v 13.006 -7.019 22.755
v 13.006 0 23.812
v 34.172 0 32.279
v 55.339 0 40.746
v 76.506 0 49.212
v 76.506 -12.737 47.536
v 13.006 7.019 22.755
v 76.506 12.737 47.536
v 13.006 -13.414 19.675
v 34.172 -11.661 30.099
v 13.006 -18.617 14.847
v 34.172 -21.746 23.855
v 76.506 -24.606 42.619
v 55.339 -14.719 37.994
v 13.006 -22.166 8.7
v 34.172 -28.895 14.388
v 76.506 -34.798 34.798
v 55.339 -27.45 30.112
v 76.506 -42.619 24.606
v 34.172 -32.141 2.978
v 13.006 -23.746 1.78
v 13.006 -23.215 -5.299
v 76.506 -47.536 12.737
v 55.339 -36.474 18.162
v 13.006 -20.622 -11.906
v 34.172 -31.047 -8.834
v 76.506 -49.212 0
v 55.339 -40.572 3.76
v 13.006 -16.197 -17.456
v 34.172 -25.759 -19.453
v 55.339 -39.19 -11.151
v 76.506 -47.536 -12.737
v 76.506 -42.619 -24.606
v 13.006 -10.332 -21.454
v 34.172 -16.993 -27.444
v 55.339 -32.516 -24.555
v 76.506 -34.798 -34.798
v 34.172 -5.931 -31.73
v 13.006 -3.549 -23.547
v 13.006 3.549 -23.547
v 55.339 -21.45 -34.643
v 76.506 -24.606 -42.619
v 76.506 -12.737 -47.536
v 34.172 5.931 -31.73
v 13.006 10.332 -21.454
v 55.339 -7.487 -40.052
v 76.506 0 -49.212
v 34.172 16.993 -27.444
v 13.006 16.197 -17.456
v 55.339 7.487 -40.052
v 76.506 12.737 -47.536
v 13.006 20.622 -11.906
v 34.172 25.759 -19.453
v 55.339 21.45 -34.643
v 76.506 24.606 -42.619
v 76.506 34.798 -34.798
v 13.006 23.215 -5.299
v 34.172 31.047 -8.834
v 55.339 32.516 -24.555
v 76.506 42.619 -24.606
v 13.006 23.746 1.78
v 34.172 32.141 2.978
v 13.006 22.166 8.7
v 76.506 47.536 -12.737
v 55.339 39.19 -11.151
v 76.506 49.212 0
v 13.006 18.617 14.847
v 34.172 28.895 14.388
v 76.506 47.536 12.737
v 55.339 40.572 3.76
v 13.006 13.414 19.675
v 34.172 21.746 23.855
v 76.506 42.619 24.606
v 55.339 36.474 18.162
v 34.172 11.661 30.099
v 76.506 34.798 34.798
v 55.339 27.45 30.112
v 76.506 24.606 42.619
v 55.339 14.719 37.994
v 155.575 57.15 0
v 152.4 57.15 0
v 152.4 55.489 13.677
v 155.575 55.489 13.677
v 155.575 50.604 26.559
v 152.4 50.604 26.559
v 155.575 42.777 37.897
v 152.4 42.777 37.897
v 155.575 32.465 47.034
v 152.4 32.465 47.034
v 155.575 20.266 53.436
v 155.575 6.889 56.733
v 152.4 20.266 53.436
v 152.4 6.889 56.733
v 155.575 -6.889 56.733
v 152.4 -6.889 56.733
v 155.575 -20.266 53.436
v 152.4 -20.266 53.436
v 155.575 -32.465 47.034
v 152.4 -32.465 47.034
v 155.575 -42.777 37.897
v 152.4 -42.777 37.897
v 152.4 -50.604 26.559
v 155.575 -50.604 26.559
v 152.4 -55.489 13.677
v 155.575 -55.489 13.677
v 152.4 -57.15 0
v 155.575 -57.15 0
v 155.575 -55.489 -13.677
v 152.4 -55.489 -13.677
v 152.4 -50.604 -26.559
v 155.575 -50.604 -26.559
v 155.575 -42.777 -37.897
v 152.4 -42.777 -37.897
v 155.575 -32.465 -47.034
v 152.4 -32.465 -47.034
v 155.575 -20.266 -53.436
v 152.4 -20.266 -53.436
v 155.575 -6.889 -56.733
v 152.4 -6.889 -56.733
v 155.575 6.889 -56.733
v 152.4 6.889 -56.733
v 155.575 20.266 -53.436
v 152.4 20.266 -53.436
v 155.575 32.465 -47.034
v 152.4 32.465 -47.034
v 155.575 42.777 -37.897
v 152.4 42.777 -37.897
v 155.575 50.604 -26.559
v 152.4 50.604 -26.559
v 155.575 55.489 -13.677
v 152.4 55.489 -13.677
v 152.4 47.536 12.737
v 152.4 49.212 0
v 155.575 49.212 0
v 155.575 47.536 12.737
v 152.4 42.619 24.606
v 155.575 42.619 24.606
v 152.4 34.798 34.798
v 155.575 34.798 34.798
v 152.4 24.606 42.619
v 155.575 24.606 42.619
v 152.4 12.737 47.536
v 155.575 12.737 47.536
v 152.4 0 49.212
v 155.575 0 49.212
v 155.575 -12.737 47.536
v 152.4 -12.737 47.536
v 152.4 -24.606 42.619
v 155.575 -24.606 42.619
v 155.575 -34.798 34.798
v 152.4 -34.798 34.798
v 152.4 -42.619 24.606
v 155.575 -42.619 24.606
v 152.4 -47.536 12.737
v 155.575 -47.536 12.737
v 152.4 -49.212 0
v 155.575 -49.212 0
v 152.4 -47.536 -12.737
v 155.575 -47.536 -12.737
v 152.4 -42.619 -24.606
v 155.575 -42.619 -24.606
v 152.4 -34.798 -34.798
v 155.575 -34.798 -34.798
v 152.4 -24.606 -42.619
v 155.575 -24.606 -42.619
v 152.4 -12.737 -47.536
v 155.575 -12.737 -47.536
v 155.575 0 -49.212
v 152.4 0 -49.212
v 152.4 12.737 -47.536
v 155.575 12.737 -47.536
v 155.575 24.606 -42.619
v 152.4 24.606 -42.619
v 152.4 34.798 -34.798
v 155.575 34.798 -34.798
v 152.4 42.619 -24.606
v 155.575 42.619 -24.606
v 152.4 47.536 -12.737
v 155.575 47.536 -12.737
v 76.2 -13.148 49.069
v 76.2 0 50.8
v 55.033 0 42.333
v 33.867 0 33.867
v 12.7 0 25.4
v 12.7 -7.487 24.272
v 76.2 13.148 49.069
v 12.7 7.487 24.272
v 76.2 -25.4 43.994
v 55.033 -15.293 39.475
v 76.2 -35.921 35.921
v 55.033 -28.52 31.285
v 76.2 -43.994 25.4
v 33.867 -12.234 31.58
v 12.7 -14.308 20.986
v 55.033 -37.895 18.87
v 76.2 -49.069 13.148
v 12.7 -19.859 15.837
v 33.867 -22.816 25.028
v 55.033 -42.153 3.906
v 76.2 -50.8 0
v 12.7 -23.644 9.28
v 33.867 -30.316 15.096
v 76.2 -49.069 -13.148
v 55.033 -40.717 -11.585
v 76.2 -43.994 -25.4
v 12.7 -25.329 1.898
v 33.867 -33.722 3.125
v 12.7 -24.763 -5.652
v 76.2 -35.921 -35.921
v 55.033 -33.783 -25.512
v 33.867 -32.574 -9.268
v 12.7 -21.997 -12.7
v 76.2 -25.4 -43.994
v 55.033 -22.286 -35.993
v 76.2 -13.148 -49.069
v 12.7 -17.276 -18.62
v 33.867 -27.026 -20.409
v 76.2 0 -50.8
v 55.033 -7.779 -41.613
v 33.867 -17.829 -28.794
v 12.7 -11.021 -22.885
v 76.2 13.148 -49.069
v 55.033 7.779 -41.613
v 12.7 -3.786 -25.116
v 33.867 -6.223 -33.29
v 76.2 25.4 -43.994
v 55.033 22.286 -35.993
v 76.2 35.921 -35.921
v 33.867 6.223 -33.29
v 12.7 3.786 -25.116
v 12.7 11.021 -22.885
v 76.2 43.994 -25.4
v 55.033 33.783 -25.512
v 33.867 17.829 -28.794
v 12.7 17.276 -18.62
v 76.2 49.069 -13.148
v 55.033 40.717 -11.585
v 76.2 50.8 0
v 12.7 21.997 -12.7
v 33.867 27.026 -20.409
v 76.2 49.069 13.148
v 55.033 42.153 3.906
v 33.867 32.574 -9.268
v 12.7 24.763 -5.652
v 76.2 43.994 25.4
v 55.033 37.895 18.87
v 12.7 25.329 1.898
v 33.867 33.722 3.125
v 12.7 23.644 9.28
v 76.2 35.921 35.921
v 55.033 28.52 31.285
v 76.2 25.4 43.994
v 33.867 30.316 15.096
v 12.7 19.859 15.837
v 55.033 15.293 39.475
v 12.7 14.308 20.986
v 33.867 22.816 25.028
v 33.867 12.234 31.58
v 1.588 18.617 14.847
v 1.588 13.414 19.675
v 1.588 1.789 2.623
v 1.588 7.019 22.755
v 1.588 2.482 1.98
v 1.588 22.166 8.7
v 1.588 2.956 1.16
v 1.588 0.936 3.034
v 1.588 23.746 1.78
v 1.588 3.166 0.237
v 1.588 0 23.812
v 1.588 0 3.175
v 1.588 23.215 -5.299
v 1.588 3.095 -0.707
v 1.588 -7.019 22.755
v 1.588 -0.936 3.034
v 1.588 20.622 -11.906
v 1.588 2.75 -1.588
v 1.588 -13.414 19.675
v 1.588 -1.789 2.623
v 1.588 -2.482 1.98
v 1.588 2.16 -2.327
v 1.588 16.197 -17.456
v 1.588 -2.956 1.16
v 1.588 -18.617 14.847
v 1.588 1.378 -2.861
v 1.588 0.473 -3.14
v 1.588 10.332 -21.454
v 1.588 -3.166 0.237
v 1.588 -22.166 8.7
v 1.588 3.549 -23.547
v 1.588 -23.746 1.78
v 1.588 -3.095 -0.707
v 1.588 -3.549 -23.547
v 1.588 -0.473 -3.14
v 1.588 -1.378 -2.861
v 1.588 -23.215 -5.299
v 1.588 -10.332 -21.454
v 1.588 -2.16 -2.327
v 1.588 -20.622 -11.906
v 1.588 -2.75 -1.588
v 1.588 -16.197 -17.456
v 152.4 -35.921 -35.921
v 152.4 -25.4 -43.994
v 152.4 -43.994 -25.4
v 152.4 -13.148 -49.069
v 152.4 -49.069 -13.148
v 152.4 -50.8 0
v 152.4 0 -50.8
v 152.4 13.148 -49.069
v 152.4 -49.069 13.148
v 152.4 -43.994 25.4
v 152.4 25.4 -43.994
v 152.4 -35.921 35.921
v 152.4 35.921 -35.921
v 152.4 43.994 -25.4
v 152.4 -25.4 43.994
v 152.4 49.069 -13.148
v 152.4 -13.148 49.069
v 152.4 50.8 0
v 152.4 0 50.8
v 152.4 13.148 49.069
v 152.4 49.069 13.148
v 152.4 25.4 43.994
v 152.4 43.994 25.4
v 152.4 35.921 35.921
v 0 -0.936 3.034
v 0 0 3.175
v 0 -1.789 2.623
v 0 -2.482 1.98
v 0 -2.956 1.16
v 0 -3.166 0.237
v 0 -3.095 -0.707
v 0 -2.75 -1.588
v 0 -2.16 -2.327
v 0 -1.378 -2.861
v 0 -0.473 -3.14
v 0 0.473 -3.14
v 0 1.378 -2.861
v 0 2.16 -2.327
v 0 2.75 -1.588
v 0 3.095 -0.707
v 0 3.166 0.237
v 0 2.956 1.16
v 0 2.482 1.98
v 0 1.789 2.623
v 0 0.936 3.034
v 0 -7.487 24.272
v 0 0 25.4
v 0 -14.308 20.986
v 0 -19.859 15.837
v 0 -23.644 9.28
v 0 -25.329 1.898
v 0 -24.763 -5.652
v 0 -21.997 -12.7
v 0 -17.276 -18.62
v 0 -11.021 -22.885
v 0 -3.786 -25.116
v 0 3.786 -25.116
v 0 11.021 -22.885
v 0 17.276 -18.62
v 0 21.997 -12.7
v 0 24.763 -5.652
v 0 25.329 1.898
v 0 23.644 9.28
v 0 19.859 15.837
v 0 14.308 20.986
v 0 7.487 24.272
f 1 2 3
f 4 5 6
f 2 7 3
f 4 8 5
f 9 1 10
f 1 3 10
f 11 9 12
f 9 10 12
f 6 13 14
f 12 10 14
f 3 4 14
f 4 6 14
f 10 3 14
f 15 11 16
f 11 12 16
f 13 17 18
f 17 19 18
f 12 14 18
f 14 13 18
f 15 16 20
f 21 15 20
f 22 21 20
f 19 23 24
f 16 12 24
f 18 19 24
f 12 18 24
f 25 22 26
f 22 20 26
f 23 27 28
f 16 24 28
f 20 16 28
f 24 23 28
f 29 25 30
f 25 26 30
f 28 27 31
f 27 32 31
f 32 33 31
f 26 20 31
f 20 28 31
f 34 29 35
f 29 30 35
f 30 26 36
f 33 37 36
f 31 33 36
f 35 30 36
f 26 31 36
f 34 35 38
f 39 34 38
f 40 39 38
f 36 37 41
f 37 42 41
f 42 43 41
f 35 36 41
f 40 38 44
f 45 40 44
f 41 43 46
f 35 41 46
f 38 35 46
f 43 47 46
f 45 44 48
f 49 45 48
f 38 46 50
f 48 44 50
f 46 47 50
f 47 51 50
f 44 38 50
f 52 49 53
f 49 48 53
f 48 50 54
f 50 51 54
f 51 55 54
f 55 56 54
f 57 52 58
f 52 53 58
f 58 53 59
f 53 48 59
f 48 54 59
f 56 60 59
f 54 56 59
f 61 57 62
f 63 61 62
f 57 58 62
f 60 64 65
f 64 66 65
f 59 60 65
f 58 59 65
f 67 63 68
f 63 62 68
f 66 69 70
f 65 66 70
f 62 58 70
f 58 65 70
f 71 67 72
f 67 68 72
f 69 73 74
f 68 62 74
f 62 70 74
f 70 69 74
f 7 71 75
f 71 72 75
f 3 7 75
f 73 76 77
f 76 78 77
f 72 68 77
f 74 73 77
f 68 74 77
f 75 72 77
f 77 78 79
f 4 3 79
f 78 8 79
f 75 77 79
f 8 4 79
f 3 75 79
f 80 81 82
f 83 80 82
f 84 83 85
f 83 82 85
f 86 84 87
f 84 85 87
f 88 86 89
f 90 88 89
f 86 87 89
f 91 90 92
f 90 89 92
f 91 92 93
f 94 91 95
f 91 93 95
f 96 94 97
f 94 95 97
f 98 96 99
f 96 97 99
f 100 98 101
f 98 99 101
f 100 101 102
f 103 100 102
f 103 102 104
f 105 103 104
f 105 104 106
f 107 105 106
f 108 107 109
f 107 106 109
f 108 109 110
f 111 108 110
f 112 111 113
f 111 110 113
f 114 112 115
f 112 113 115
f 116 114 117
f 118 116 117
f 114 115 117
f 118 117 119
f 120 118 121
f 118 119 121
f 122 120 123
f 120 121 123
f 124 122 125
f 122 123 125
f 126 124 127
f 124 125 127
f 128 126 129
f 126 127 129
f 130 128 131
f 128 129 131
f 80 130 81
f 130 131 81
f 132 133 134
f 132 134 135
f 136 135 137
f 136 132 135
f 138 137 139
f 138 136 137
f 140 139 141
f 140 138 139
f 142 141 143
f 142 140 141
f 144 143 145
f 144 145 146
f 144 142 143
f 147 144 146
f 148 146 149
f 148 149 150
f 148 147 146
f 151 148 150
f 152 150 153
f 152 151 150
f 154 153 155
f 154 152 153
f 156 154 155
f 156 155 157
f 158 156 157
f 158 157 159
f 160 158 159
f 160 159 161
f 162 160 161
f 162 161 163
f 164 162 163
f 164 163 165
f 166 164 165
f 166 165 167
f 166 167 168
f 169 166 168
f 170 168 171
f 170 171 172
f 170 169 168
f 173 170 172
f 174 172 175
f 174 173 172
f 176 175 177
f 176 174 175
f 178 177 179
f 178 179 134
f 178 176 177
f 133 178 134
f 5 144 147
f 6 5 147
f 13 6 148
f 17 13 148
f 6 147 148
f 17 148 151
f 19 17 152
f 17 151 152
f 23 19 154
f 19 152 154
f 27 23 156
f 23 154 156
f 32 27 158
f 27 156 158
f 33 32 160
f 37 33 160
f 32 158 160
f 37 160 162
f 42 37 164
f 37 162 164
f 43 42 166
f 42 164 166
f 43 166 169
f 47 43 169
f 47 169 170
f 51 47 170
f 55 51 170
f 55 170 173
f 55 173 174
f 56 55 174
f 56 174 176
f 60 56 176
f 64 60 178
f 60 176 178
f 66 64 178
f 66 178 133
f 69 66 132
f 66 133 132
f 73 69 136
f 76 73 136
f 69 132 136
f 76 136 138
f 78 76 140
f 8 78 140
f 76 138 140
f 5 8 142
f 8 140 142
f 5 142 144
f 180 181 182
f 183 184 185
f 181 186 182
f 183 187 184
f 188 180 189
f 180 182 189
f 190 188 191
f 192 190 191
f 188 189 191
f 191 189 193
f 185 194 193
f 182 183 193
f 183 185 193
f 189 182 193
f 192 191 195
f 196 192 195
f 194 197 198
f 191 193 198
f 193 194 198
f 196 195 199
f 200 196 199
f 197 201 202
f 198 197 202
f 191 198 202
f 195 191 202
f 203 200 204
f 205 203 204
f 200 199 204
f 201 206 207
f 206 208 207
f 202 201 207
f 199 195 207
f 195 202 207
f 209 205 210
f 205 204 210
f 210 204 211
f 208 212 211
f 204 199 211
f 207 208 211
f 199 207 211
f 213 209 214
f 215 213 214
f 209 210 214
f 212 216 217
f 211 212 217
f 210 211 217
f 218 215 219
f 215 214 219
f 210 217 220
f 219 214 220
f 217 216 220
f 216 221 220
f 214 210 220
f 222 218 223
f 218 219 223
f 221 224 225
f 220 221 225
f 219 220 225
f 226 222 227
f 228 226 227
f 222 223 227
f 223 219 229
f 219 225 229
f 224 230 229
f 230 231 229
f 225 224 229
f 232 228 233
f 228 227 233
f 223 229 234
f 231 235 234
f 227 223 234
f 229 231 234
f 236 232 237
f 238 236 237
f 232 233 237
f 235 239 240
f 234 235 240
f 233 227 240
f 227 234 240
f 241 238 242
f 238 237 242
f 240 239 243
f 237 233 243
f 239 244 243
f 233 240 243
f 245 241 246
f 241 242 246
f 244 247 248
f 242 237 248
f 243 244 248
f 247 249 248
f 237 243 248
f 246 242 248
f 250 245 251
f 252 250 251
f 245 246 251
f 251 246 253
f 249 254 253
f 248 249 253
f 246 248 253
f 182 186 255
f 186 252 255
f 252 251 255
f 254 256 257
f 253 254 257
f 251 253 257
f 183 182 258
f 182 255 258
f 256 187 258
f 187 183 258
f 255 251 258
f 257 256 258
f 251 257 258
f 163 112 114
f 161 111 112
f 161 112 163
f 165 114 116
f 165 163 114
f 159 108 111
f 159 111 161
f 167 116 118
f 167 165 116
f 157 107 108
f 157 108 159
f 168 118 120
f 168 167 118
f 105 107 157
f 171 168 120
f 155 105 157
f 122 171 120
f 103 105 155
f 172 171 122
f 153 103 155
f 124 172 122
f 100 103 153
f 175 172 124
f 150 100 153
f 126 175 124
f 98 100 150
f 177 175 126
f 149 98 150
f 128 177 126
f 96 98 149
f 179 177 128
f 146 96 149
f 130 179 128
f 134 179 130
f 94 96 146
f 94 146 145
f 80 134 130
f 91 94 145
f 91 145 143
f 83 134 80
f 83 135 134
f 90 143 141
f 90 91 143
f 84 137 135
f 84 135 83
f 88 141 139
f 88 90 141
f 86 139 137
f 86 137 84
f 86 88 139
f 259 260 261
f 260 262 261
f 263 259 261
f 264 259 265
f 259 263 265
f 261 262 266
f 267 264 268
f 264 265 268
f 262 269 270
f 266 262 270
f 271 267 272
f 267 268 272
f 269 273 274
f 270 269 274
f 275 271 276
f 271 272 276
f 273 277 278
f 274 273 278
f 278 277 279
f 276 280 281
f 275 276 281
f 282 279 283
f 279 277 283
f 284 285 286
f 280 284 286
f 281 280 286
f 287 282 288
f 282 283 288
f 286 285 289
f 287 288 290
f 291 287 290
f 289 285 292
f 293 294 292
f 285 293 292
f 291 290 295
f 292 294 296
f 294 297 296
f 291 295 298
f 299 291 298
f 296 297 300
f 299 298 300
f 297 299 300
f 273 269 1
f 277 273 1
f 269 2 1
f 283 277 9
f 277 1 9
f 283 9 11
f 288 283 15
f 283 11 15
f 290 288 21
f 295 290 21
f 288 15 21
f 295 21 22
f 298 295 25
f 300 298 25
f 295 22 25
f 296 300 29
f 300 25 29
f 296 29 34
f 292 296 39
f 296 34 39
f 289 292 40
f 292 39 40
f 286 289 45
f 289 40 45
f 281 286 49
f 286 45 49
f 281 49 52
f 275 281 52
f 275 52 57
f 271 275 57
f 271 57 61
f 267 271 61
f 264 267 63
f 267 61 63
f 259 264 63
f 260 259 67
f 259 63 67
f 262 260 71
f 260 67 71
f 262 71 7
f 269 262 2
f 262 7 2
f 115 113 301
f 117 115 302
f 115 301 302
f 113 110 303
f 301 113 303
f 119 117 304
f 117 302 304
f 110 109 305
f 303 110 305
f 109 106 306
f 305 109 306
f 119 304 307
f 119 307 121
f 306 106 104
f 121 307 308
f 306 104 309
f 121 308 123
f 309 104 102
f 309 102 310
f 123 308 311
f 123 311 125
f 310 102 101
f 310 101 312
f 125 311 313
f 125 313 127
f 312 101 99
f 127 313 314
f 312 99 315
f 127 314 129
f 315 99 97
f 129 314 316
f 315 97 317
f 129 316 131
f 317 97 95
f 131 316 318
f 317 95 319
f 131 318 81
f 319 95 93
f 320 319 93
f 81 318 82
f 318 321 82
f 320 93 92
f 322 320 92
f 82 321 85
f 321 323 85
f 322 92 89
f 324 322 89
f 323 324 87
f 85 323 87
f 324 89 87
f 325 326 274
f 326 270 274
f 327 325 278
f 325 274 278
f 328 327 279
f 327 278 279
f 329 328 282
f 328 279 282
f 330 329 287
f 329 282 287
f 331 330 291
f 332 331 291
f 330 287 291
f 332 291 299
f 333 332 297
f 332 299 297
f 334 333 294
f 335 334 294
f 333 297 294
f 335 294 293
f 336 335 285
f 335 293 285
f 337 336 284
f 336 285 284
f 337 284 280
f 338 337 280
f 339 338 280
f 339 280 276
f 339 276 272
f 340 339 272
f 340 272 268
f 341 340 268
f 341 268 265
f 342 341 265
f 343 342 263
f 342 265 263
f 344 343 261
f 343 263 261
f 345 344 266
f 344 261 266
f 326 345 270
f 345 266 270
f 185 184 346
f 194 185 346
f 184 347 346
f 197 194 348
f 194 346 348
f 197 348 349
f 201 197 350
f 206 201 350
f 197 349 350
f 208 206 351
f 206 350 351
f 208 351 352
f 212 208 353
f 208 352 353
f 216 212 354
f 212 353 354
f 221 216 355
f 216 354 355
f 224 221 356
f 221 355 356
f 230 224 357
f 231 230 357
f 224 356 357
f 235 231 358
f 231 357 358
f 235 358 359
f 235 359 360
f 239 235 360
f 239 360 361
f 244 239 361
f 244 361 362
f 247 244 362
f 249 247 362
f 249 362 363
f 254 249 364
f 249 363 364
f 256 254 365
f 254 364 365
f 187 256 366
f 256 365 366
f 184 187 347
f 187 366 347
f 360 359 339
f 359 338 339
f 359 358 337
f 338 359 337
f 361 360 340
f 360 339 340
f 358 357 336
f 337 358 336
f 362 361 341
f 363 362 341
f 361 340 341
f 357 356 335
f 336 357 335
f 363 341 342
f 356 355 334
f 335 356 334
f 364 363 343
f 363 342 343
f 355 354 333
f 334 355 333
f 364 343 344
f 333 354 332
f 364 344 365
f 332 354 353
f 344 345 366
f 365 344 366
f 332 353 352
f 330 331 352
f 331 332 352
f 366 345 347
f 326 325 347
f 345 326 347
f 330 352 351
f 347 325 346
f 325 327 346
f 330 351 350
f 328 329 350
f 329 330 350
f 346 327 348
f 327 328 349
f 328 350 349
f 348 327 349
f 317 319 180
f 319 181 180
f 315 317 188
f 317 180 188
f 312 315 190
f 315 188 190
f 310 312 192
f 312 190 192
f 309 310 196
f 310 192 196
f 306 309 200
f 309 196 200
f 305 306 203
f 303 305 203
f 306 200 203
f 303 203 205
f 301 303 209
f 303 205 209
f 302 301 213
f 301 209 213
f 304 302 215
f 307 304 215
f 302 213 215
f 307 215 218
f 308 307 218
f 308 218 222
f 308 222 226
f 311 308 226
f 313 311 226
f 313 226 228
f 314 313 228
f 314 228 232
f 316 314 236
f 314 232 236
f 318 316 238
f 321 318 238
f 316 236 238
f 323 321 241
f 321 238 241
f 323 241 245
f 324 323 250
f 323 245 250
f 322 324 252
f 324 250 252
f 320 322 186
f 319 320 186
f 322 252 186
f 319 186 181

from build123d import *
from build123d import SkipClean  # not in build123d's __all__

# Parameters (mm, degrees)
F2_R     = 57.15
F2_R_2   = 49.2125
F3_DEPTH = 3.175


# Not quite as in the source:
# - a feature of the source that left no trace in its solid (it failed there, or was rolled back) is left out


with BuildPart() as f1:
    # F0 (on Front) → F1 (revolve)
    with BuildSketch(Plane.XZ):
        Polygon((152.4, 50.8), (76.2, 50.8), (12.7, 25.4), (0, 25.4), (0, 3.175), (1.5875, 3.175), (1.5875, 23.8125), (13.0057245657, 23.8125), (76.5057245657, 49.2125), (152.4, 49.2125), align=None)
    revolve(axis=Axis((76.2, 0, 0), (1, 0, 0)))

    # F2 (on face) → F3 (join)
    with BuildSketch(Plane.YZ.offset(152.4)):
        Circle(F2_R)
        Circle(F2_R_2, mode=Mode.SUBTRACT)
    with SkipClean():  # cleaning this boolean's faces spoils the solid; the shape is the same uncleaned
        extrude(amount=F3_DEPTH)


solid = f1.part
